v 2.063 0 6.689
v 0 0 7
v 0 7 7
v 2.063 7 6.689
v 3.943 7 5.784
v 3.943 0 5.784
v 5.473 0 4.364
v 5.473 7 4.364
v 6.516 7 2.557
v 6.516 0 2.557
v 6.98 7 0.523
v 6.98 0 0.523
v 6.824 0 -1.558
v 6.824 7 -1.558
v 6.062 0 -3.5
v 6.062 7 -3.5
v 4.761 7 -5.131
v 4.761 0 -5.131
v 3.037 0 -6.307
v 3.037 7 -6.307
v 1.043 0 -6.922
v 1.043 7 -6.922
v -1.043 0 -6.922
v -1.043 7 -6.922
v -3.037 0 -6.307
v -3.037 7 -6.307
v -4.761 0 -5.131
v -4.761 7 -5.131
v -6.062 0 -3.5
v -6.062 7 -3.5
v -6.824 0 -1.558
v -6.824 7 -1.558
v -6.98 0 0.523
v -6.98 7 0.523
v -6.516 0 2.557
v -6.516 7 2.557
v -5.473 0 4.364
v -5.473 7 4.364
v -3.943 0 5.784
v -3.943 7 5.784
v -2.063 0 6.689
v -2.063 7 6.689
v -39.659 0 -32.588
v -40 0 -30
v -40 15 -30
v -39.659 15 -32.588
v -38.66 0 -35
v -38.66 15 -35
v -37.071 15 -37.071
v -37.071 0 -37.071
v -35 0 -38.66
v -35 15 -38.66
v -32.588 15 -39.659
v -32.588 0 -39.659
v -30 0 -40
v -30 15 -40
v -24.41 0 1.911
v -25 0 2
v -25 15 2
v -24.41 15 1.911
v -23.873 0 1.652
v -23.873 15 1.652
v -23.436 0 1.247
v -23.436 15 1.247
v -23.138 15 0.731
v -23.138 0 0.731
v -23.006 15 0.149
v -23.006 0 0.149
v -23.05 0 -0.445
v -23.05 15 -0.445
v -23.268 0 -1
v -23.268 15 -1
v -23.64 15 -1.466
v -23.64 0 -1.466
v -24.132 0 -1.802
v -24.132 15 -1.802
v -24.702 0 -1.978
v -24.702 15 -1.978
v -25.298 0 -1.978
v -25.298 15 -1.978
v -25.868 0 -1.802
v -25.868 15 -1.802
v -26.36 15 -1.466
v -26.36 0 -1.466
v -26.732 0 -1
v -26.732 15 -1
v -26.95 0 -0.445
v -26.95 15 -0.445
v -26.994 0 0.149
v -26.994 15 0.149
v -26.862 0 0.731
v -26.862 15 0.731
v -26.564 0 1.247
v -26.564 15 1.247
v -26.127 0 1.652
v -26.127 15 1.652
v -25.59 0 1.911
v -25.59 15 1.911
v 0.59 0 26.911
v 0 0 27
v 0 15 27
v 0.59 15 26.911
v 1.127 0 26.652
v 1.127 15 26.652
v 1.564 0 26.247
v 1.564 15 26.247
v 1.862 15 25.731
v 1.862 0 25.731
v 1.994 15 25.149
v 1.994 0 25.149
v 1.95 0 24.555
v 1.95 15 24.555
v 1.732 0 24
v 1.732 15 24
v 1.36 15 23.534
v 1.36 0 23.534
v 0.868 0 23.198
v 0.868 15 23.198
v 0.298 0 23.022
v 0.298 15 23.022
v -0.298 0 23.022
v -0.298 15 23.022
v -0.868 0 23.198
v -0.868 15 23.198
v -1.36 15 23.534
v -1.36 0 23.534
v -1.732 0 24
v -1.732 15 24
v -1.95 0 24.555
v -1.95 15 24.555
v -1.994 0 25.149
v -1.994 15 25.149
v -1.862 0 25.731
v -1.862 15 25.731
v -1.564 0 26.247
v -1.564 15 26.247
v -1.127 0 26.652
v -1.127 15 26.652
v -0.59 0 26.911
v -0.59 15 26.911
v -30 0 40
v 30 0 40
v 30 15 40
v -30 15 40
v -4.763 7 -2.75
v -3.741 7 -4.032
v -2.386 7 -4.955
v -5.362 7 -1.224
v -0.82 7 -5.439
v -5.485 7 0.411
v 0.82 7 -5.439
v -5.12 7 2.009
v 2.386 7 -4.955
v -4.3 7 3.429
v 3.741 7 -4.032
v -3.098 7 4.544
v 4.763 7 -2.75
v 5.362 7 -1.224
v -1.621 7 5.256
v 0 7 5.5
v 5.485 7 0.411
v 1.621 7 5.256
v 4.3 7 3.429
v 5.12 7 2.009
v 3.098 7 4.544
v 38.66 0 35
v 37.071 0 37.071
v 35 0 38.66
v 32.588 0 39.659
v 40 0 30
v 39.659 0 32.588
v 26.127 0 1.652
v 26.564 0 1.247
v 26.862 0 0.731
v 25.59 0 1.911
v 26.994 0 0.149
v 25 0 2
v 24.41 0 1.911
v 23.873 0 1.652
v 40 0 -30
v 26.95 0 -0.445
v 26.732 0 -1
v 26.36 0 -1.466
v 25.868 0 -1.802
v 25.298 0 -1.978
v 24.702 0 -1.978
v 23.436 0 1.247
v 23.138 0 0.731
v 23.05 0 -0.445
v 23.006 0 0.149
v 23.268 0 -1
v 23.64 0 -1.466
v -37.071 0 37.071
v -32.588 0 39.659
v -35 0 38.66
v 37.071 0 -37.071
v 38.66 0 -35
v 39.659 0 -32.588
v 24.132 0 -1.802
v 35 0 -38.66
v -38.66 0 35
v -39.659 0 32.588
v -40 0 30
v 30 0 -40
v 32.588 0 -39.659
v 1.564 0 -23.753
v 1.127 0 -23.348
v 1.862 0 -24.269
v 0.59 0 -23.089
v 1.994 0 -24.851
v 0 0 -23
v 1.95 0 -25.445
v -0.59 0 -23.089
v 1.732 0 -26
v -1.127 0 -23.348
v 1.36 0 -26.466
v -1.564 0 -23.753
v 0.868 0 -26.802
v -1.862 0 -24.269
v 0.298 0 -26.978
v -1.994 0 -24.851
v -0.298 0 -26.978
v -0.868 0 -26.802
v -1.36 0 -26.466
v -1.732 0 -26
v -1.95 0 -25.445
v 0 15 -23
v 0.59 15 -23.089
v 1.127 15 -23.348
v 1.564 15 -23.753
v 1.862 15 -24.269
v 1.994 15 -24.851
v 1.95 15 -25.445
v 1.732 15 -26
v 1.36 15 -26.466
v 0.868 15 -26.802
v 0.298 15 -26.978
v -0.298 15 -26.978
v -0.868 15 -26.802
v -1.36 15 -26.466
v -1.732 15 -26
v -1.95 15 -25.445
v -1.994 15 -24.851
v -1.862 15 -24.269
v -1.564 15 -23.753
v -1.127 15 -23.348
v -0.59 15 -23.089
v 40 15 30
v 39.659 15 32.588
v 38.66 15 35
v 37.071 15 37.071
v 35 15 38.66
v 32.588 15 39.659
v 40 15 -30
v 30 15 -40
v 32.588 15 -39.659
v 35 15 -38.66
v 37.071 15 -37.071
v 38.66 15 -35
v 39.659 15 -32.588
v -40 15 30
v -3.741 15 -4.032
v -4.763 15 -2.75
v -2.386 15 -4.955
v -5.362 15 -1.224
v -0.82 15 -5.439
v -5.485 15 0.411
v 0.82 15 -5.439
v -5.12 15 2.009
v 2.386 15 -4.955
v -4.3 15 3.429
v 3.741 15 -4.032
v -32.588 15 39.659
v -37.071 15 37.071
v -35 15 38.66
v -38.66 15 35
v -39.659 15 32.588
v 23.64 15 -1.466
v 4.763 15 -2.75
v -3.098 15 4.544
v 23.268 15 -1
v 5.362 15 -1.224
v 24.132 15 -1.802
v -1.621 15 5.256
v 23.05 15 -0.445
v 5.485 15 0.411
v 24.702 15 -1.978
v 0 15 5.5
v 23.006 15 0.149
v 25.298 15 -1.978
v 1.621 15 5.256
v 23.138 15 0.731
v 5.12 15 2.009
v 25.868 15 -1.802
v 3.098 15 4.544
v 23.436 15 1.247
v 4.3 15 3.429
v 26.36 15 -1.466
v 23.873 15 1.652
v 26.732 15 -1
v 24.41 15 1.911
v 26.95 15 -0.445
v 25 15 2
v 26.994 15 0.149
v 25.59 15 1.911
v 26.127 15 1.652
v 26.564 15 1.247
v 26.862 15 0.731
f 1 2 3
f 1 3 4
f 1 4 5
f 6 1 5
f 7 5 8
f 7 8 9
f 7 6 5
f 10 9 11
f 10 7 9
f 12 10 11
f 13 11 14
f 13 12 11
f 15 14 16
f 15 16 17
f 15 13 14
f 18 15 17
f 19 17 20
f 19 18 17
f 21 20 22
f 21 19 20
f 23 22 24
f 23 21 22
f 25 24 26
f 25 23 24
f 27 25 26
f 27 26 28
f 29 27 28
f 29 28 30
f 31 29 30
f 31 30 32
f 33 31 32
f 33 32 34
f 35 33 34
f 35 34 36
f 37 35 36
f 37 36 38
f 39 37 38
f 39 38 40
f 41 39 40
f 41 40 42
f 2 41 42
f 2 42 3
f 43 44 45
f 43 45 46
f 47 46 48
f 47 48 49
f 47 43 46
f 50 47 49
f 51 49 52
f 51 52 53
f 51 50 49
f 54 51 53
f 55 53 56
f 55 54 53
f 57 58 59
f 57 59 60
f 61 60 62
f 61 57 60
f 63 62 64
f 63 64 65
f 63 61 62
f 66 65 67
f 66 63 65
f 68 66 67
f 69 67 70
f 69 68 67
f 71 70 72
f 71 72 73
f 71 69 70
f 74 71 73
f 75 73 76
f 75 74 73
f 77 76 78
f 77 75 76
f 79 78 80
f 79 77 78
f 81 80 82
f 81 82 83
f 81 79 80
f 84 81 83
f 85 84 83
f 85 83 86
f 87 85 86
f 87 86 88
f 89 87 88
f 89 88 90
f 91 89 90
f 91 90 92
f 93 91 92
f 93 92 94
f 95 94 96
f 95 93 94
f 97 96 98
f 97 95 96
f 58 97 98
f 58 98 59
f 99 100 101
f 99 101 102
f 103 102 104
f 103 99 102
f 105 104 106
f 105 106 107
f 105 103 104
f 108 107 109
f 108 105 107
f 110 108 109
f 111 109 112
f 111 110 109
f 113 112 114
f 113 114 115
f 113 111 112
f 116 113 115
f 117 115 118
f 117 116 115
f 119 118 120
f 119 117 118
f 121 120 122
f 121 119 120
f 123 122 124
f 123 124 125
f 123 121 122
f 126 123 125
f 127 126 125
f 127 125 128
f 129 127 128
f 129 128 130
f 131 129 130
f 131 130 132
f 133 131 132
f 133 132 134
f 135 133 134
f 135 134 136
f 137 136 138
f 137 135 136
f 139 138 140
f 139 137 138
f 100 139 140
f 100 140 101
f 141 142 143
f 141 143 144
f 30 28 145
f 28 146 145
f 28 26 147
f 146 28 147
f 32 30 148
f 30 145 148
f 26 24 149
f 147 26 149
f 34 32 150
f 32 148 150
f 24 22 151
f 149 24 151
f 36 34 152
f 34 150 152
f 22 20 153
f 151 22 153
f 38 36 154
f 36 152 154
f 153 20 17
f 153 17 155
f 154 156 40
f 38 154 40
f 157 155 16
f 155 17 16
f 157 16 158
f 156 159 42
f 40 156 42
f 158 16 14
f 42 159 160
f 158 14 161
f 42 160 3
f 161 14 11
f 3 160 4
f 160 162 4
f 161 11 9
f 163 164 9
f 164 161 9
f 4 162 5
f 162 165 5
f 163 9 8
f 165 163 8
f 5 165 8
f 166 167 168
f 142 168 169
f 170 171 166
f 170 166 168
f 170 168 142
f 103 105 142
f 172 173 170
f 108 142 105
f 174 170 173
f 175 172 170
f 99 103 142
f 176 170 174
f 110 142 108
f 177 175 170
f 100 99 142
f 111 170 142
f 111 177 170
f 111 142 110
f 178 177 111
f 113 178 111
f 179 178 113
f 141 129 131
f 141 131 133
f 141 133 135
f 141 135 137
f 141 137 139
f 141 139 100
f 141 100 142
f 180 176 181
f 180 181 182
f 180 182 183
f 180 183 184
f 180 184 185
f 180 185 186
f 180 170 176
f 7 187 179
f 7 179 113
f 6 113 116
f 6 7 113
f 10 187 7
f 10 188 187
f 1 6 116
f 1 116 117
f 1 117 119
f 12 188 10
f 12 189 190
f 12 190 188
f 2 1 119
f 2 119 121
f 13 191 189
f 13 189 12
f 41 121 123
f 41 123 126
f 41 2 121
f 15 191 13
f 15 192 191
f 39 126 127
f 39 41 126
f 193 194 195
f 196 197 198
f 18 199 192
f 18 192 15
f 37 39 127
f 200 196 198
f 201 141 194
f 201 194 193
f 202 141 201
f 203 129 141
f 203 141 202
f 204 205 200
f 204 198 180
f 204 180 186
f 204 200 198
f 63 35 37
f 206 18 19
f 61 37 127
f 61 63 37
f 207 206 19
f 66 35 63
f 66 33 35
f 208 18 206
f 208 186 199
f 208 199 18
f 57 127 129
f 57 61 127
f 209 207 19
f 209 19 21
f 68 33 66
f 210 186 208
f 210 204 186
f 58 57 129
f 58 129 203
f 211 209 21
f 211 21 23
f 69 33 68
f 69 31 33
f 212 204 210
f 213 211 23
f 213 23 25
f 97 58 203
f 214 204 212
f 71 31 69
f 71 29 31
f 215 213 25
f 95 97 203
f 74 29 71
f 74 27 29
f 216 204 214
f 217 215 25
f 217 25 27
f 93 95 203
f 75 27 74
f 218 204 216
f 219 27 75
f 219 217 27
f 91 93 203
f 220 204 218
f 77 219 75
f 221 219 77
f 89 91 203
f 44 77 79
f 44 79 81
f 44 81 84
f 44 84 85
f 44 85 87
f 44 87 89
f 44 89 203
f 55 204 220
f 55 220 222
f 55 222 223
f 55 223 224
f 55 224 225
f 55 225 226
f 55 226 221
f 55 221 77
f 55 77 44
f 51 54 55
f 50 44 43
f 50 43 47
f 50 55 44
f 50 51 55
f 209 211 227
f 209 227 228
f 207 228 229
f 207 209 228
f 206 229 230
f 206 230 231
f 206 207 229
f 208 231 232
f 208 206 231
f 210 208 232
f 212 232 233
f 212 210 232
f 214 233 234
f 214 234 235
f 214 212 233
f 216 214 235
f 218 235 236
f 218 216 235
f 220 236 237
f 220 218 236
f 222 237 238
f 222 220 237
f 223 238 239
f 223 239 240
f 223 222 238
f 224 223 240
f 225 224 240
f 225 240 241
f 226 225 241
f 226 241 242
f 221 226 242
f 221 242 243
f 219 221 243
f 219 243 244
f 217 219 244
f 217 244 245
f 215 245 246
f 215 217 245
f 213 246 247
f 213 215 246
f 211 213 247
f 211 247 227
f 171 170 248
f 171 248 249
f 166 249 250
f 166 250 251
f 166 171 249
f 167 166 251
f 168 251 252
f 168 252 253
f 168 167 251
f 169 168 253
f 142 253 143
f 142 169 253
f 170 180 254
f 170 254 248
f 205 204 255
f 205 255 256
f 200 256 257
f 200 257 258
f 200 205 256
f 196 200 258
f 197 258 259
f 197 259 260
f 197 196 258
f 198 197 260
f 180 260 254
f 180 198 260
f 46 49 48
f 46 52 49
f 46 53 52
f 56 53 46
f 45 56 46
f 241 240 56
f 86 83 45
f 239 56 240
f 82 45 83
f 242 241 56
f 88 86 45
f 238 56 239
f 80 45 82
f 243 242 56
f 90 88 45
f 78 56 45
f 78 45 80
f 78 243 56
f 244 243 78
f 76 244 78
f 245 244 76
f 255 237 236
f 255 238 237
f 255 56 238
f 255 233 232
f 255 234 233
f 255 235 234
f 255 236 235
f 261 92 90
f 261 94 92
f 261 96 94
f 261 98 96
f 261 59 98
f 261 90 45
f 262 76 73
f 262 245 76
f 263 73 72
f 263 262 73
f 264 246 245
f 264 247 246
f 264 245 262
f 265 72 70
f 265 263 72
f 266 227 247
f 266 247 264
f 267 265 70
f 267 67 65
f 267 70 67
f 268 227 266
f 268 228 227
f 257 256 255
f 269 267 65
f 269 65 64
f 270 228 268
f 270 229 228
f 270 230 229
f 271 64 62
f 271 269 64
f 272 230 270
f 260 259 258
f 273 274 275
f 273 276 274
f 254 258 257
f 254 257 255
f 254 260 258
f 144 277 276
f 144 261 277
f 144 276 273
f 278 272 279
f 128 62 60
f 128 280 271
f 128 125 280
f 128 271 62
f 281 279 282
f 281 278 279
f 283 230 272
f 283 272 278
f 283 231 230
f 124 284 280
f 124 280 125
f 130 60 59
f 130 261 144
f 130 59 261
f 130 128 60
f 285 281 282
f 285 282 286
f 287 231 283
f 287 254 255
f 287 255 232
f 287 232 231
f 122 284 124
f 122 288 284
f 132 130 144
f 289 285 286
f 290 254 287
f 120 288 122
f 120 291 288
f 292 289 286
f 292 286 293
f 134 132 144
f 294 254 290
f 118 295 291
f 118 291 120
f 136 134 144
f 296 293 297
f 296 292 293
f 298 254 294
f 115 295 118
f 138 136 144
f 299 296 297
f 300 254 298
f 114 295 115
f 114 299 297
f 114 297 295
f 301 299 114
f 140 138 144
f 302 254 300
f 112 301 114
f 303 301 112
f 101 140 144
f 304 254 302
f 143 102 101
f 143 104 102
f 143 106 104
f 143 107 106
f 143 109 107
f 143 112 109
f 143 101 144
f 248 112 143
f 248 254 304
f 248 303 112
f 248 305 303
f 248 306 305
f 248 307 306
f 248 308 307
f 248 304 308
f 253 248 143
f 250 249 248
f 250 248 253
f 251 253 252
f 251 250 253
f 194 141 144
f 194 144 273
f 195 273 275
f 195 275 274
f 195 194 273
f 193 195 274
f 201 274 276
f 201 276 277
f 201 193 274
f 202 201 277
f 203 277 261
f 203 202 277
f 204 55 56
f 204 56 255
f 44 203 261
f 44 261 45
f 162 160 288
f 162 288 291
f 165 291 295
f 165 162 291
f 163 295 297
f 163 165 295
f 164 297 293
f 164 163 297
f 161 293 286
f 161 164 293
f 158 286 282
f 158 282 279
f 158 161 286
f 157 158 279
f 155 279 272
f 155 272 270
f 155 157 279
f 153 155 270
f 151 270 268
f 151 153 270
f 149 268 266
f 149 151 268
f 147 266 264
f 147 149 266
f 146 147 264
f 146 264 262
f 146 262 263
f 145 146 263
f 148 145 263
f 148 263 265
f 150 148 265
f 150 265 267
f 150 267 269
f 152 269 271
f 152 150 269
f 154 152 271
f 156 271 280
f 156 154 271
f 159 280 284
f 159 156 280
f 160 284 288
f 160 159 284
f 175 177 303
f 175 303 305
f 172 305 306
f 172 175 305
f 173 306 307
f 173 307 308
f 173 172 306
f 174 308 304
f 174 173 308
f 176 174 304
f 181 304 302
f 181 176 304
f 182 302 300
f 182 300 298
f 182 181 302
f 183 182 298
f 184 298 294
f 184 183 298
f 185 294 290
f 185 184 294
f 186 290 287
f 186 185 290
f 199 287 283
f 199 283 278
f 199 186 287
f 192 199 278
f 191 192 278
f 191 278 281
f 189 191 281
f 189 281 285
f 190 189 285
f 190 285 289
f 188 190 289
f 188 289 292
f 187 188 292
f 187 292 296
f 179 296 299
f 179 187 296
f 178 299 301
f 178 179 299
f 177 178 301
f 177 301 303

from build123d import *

# Parameters (mm, degrees)
SKETCH1_R           = 7
SKETCH1_R_2         = 2
BOSS_EXTRUDE1_DEPTH = 15
BOSS_EXTRUDE2_START = -8
SKETCH2_R           = 7
SKETCH2_R_2         = 5.5
BOSS_EXTRUDE2_DEPTH = 8


with BuildPart() as part:
    # Sketch1 → Boss-Extrude1 (new body)
    with BuildSketch(Plane(origin=(0, 0, 0), x_dir=(1, 0, 0), z_dir=(0, 1, 0))):
        with BuildLine():
            Line((-30, 40), (30, 40))
            ThreePointArc((30, 40), (37.071067812, 37.071067812), (40, 30))
            Line((40, 30), (40, -30))
            ThreePointArc((40, -30), (37.071067812, -37.071067812), (30, -40))
            Line((30, -40), (-30, -40))
            ThreePointArc((-30, -40), (-37.071067812, -37.071067812), (-40, -30))
            Line((-40, -30), (-40, 30))
            ThreePointArc((-40, 30), (-37.071067812, 37.071067812), (-30, 40))
        make_face()
        with Locations(Location((0, 0, 0), (0, 0, 270))):
            Circle(SKETCH1_R, mode=Mode.SUBTRACT)
        with Locations(Location((0, 25, 0), (0, 0, 270))):
            Circle(SKETCH1_R_2, mode=Mode.SUBTRACT)
        with Locations(Location((0, -25, 0), (0, 0, 270))):
            Circle(SKETCH1_R_2, mode=Mode.SUBTRACT)
        with Locations(Location((-25, 0, 0), (0, 0, 270))):
            Circle(SKETCH1_R_2, mode=Mode.SUBTRACT)
        with Locations(Location((25, 0, 0), (0, 0, 270))):
            Circle(SKETCH1_R_2, mode=Mode.SUBTRACT)
    extrude(amount=BOSS_EXTRUDE1_DEPTH)

    # Sketch2 → Boss-Extrude2 (add)
    with BuildSketch(Plane(origin=(0, 15, 0), x_dir=(1, 0, 0), z_dir=(0, 1, 0)).offset(BOSS_EXTRUDE2_START)):
        with Locations(Location((0, 0, 0), (0, 0, 270))):
            Circle(SKETCH2_R)
        with Locations(Location((0, 0, 0), (0, 0, 270))):
            Circle(SKETCH2_R_2, mode=Mode.SUBTRACT)
    extrude(amount=BOSS_EXTRUDE2_DEPTH)


solid = part.part
